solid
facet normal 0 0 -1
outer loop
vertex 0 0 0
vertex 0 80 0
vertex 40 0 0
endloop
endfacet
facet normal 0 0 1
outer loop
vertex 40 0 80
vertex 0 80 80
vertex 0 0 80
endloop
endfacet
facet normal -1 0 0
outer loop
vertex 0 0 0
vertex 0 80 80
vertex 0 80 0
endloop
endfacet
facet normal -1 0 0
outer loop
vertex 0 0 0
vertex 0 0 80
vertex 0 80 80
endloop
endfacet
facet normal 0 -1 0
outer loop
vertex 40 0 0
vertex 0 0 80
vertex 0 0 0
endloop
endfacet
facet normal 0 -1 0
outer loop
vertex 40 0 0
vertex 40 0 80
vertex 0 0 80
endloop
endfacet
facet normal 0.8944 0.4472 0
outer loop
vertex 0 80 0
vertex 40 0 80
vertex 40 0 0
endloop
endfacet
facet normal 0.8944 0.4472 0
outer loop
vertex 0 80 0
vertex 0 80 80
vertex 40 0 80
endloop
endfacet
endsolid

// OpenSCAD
// Support triangle: base = ping pong ball diameter, height = double the base
// The 90 degree angle is at the origin, between the base (X) and the height (Y).

ball_d    = 40;            // ping pong ball diameter
base      = ball_d;        // 40 mm
height    = 2 * ball_d;  // 80 mm
thickness = 2 * ball_d;    // extrusion thickness (Z)

linear_extrude(height = thickness)
    polygon(points = [[0, 0], [base, 0], [0, height]]);
